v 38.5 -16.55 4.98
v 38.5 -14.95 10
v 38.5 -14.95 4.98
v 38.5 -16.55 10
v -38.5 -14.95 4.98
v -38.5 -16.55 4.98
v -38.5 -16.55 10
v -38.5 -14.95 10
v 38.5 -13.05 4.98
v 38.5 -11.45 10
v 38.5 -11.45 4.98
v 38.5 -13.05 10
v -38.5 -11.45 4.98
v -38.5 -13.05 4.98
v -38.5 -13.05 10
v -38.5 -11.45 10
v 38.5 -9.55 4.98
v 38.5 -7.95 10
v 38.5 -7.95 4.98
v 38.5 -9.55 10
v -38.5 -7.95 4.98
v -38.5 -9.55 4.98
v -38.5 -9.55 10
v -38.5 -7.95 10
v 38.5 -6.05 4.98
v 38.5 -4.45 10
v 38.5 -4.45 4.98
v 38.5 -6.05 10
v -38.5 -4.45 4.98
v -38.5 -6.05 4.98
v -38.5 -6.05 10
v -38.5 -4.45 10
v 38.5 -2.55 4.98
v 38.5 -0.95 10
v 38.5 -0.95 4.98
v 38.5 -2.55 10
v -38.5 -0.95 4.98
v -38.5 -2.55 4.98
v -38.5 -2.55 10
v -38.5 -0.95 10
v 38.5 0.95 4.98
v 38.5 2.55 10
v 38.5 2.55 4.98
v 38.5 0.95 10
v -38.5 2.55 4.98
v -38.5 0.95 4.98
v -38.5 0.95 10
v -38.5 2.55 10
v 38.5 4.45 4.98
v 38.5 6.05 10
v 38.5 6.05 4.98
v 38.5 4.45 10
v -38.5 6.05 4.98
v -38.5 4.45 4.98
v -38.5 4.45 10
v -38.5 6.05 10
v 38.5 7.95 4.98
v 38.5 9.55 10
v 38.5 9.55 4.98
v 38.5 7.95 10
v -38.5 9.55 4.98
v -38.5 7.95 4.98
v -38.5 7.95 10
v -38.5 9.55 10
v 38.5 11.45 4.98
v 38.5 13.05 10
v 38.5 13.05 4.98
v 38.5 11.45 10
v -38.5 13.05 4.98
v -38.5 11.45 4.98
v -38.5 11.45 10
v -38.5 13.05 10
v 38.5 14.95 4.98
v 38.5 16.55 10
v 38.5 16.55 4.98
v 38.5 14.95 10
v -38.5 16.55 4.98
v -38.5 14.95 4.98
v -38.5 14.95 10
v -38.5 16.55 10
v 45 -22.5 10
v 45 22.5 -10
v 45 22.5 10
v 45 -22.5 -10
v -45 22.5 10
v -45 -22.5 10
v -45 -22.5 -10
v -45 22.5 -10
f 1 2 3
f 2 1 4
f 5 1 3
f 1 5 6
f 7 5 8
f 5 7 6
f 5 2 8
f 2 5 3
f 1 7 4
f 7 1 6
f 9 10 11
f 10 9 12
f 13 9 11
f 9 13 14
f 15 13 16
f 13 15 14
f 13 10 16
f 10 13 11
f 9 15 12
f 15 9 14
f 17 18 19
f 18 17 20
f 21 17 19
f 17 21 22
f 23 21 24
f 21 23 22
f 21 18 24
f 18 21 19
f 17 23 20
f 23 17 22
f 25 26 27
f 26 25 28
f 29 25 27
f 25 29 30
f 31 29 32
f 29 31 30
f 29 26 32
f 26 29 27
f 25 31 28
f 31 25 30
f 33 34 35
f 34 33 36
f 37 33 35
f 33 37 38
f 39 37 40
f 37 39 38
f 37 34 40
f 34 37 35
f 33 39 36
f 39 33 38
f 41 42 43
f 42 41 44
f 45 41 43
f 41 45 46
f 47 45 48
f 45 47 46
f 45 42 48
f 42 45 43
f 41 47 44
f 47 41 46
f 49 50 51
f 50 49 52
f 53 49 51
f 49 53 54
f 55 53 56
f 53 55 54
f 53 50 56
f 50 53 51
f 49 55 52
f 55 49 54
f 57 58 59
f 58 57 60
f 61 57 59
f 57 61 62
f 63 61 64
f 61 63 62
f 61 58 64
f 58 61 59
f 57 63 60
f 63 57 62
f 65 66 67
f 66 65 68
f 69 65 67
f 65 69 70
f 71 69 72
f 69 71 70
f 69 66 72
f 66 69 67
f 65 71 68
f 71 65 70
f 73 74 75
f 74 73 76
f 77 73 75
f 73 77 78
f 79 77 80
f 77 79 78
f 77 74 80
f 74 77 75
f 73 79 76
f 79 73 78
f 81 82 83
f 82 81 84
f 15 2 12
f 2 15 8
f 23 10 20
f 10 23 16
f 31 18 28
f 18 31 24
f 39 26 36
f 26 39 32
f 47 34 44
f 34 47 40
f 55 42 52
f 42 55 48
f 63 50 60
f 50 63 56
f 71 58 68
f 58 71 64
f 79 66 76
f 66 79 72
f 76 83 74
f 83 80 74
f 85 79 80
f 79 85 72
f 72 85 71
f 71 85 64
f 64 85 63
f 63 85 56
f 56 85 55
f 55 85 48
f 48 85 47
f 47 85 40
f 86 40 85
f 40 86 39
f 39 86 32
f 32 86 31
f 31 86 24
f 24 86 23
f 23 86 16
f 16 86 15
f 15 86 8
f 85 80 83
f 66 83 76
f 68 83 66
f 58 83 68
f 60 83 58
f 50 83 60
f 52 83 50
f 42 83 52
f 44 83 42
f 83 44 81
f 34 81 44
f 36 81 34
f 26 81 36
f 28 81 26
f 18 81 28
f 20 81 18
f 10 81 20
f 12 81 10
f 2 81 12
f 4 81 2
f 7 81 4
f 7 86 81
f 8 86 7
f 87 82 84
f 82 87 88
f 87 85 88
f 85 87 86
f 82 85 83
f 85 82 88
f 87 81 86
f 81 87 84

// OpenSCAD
$fn = 64;

// Dimensions in millimeters
rack_length = 90;   // X-axis length of base
rack_width = 45;    // Y-axis width of base
rack_height = 20;   // Z-axis height of base

slot_length = 77; // X-axis length of each slot
slot_width = 1.6; // Y-axis width of each slot
slot_depth = 10;  // Z-axis depth of each slot (from top surface)

num_slots = 10; // Number of slots
slot_center_spacing = 3.5; // Center-to-center spacing between slots (Y-axis)

// Calculate starting Y position for slot centers (centered on rack)
slot_start_y = -((num_slots - 1) * slot_center_spacing) / 2;

// Hole dimensions for Z-axis (extended 0.01mm beyond rack top and slot bottom)
hole_z_start = rack_height - slot_depth - 0.01;
hole_z_end = rack_height + 0.01;
hole_z_height = hole_z_end - hole_z_start;

// Base block (centered at origin, resting on XY plane at Z=0)
difference() {
    cube([rack_length, rack_width, rack_height], center = true);
    for (i = [0 : 1 : num_slots - 1]) {
        // Calculate Y center for current slot
        y_center = slot_start_y + i * slot_center_spacing;
        
        // Create hole cube (centered in X/Y for slot, placed at correct Z)
        translate([0, y_center, hole_z_start])
            cube([slot_length, slot_width, hole_z_height], center = true);
    }
}
